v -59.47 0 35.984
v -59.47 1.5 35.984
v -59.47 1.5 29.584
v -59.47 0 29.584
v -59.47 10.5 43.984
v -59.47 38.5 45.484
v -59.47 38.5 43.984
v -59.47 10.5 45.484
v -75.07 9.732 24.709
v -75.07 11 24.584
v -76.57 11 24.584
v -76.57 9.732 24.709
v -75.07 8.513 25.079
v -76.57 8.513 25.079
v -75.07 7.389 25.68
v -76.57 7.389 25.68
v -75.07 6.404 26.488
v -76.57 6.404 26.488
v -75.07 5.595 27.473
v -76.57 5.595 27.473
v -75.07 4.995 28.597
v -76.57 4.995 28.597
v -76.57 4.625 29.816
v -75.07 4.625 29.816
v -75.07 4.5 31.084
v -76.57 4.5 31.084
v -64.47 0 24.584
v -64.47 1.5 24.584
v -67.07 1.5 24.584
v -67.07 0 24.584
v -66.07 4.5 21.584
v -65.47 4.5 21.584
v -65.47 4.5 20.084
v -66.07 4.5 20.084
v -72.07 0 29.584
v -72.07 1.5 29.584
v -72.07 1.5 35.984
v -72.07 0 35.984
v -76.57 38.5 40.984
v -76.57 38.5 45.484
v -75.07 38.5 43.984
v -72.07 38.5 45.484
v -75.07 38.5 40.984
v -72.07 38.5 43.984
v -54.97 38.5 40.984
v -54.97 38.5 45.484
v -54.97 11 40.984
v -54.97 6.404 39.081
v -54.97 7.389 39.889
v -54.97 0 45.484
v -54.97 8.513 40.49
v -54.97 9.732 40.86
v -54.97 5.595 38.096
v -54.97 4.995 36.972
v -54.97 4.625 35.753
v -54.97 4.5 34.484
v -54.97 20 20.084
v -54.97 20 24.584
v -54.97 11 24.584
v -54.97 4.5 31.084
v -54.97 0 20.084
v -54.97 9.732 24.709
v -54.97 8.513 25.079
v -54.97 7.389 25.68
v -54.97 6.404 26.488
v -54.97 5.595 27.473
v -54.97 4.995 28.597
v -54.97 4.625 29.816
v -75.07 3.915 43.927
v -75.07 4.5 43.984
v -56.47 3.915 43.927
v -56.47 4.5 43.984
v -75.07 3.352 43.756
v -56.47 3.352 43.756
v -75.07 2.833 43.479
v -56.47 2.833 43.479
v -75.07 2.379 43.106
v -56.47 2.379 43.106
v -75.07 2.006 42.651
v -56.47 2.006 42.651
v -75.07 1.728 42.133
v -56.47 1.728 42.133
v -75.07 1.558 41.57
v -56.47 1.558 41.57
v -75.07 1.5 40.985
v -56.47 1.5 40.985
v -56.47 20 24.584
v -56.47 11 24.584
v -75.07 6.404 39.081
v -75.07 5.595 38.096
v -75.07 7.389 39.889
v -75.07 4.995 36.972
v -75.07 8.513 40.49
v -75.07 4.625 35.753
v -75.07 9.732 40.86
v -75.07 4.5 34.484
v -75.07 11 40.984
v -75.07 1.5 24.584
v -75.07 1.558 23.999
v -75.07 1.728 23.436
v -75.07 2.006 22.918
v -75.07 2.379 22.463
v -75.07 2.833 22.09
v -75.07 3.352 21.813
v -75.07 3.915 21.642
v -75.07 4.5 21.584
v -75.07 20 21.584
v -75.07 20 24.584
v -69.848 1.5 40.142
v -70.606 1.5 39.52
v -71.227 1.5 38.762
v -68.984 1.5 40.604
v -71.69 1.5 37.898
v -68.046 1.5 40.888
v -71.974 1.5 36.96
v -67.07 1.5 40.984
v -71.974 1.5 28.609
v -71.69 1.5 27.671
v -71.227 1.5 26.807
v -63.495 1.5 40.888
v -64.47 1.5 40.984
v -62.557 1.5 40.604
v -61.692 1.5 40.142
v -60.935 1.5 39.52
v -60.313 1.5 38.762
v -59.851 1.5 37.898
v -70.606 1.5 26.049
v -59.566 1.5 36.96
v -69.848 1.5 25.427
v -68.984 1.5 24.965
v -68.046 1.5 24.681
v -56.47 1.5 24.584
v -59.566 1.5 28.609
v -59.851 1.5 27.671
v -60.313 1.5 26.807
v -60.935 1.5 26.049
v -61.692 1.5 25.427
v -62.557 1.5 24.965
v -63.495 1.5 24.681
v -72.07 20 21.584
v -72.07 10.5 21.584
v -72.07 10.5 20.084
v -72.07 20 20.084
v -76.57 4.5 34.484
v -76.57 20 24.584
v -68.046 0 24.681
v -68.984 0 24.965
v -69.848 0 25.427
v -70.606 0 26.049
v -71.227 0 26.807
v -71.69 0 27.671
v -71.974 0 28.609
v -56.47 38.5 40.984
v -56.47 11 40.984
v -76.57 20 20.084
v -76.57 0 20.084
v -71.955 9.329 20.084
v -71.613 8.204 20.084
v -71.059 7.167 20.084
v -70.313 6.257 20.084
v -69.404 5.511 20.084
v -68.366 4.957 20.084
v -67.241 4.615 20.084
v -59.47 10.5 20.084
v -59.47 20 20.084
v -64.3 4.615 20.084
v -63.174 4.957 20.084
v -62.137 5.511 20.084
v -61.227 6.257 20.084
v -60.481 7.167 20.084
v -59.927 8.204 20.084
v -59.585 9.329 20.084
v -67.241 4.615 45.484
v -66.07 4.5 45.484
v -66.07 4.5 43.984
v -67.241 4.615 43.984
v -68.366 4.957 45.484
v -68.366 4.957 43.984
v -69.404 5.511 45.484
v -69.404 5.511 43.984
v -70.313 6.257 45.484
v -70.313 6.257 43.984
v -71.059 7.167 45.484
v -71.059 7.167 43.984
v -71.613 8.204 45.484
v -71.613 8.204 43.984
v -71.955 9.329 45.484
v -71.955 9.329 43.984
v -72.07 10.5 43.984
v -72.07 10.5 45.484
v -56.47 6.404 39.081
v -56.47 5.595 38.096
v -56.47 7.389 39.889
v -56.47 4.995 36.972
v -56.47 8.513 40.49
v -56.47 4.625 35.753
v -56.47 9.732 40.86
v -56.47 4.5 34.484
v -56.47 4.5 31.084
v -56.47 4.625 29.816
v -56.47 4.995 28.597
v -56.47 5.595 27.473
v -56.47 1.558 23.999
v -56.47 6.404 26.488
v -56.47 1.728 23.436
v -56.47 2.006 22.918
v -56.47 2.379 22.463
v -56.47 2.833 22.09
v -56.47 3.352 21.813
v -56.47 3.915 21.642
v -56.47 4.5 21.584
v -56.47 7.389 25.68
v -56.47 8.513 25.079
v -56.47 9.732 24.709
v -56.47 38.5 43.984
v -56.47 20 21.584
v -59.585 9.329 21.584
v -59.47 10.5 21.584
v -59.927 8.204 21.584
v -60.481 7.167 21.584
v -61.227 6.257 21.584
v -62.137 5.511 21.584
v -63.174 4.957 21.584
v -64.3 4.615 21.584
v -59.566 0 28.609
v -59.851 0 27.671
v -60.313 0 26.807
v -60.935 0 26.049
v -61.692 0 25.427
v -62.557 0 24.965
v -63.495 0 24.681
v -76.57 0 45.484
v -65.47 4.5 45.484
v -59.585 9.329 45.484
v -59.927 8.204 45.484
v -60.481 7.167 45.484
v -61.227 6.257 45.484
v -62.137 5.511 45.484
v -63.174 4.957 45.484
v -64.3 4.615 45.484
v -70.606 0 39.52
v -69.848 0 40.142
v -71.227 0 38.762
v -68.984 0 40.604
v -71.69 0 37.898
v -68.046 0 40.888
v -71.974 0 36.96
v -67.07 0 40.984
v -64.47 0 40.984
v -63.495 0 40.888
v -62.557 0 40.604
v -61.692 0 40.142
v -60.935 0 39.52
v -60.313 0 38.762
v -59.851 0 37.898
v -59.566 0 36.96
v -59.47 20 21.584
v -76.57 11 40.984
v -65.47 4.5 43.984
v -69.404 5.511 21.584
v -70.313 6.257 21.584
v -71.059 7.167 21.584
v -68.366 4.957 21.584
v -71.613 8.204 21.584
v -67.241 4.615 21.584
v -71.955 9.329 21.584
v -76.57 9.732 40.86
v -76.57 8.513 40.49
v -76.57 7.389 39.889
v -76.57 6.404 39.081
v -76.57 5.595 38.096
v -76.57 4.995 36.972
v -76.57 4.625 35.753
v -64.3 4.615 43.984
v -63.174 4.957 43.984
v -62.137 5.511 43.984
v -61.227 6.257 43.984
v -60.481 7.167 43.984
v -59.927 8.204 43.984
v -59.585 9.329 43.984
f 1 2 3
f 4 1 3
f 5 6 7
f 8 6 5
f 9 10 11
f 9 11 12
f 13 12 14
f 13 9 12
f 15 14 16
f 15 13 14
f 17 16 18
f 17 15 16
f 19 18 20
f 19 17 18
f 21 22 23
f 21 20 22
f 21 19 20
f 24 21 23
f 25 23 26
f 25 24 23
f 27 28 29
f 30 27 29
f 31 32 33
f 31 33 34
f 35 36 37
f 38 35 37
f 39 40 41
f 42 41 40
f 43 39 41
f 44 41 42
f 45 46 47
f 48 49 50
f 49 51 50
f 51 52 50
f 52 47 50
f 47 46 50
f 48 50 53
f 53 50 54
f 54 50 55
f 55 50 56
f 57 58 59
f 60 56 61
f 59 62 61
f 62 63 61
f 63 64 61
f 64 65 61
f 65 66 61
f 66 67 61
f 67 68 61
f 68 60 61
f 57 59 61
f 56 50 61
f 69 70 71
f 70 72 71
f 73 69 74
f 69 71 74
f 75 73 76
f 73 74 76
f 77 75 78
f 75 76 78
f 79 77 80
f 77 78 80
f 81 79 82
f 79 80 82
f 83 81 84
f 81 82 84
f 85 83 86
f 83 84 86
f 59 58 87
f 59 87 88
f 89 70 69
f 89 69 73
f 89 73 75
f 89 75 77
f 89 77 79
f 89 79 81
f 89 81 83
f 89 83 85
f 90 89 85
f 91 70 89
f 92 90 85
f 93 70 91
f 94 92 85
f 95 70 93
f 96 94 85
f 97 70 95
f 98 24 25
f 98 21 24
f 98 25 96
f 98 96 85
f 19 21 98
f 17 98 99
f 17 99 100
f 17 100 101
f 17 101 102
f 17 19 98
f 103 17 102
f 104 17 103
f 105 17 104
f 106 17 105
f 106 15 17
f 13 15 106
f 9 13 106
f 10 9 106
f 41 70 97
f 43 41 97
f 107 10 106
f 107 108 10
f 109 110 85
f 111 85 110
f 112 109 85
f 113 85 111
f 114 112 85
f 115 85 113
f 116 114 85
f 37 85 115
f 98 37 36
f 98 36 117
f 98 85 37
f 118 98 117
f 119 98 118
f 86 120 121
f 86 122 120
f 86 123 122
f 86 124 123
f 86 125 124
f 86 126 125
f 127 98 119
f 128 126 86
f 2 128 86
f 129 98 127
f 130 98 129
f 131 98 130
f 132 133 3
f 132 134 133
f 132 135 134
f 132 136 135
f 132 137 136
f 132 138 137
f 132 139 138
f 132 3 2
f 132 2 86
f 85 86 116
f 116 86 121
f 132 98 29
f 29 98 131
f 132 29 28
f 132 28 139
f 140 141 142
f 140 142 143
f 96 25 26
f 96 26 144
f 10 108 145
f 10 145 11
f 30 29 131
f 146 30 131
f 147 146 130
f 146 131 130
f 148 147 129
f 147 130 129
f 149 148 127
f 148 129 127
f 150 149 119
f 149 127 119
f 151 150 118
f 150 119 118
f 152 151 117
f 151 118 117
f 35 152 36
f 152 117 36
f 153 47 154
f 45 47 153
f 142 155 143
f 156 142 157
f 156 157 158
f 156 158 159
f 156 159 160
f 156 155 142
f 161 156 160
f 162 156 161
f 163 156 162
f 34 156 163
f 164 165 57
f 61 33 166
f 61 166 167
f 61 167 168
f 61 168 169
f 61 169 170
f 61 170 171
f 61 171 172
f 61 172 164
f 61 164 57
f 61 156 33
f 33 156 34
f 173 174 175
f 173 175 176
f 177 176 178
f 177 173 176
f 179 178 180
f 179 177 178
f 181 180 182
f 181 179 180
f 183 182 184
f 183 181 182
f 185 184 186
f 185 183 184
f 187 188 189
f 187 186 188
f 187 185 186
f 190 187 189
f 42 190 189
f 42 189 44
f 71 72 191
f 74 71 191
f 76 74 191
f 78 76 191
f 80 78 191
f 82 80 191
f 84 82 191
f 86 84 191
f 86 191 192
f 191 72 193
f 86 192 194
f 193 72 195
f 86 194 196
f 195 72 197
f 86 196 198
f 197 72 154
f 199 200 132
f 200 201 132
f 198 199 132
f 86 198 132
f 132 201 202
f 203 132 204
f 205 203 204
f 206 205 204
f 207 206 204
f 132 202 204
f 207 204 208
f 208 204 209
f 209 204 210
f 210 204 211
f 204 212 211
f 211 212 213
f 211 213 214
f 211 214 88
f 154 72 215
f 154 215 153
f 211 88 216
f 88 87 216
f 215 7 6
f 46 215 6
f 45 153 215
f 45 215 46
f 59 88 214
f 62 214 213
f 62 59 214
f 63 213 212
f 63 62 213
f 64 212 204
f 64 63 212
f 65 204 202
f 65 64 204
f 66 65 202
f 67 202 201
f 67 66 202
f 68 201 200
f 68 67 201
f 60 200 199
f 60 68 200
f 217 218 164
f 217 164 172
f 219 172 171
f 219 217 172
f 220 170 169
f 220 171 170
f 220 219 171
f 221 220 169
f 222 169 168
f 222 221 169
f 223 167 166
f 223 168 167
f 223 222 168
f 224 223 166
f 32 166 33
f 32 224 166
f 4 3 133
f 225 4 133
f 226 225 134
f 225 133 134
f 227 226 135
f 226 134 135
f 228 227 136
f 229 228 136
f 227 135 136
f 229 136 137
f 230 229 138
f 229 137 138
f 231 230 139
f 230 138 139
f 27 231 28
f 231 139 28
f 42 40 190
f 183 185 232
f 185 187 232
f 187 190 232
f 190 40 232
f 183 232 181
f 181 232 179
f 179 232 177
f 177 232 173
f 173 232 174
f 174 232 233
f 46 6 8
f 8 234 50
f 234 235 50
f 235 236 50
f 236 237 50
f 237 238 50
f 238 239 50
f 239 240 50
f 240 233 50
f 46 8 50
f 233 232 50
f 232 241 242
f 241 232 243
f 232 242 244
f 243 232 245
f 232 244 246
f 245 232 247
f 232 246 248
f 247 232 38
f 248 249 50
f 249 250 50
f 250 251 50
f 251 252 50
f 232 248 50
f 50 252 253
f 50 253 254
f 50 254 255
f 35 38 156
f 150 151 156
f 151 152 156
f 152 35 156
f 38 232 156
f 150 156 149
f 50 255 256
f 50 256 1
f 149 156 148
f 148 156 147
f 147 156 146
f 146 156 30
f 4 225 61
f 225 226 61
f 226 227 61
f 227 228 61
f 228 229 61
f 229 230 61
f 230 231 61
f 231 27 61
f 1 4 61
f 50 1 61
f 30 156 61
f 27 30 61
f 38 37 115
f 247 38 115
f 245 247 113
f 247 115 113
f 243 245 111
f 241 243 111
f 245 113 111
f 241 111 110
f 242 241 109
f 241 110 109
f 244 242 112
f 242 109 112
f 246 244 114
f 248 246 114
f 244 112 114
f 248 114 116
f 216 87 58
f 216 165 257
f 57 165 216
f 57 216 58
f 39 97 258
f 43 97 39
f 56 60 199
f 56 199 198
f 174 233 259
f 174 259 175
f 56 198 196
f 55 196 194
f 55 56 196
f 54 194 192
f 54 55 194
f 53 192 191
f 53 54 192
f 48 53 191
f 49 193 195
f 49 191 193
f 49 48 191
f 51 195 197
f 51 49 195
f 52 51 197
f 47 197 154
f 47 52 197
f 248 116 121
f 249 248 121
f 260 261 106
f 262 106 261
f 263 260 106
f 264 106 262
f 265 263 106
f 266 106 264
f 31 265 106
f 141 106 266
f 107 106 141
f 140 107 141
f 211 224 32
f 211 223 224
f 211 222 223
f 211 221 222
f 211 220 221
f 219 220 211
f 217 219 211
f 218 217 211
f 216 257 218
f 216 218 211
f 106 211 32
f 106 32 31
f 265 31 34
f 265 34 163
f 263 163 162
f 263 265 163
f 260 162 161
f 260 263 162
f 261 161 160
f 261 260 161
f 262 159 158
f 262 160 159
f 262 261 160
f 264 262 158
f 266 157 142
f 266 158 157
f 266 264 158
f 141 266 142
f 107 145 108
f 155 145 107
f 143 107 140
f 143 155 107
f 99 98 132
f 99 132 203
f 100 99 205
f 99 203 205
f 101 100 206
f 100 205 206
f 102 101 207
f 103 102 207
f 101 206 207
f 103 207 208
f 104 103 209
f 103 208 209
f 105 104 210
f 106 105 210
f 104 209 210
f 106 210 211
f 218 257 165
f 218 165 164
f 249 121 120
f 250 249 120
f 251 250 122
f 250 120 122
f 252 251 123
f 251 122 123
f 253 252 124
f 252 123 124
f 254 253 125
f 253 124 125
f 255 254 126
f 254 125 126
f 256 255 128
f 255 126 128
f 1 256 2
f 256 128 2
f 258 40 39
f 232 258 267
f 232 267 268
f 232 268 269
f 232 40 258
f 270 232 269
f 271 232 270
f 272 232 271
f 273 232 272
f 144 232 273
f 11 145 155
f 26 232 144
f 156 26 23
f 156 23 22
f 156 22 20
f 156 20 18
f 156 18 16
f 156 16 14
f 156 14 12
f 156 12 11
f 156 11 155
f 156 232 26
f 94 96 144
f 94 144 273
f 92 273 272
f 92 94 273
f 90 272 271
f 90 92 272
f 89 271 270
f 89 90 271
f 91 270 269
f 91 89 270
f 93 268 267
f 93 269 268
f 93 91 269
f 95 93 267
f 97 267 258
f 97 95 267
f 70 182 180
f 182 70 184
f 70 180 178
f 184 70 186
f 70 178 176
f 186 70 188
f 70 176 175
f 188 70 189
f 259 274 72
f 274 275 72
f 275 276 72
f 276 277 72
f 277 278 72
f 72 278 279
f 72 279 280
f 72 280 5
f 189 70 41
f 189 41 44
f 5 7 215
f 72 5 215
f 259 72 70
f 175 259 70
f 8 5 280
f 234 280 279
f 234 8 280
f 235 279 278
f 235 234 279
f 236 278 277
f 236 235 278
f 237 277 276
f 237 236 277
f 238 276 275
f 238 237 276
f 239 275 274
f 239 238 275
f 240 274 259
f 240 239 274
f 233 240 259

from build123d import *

# Parameters (mm, degrees)
SKETCH1_W           = 21.6
SKETCH1_H           = 25.4
BOSS_EXTRUDE1_DEPTH = 38.5
SKETCH2_W           = 18.6
SKETCH2_H           = 22.4
CUT_EXTRUDE1_DEPTH  = 37
CUT_EXTRUDE2_DEPTH  = 25.5
CUT_EXTRUDE3_DEPTH  = 25.5
CUT_EXTRUDE4_DEPTH  = 1.5
FILLET2_R           = 3
FILLET3_R           = 3
SKETCH7_W           = 21.6
SKETCH7_H           = 4.5
CUT_EXTRUDE5_DEPTH  = 18.5


with BuildPart() as part:
    # Sketch1 → Boss-Extrude1 (new body)
    with BuildSketch(Plane(origin=(0, 0, 0), x_dir=(1, 0, 0), z_dir=(0, 1, 0))):
        with Locations((-65.770128024, -32.78448737)):
            Rectangle(SKETCH1_W, SKETCH1_H)
    extrude(amount=BOSS_EXTRUDE1_DEPTH)

    # Sketch2 → Cut-Extrude1 (cut)
    with BuildSketch(Plane(origin=(0, 38.5, 0), x_dir=(1, 0, 0), z_dir=(0, 1, 0))):
        with Locations((-65.770128024, -32.78448737)):
            Rectangle(SKETCH2_W, SKETCH2_H)
    extrude(amount=-CUT_EXTRUDE1_DEPTH, mode=Mode.SUBTRACT)

    # Sketch5 → Cut-Extrude2 (cut)
    with BuildSketch(Plane.XY.offset(45.48448737)):
        with BuildLine():
            Line((-72.070128024, 38.5), (-59.470128024, 38.5))
            Line((-59.470128024, 38.5), (-59.470128024, 10.5))
            ThreePointArc((-59.470128024, 10.5), (-61.227487337, 6.257359313), (-65.470128024, 4.5))
            Line((-65.470128024, 4.5), (-66.070128024, 4.5))
            ThreePointArc((-66.070128024, 4.5), (-70.312768711, 6.257359313), (-72.070128024, 10.5))
            Line((-72.070128024, 10.5), (-72.070128024, 38.5))
        make_face()
    extrude(amount=-CUT_EXTRUDE2_DEPTH, mode=Mode.SUBTRACT)

    # Sketch3 → Cut-Extrude3 (cut)
    with BuildSketch(Plane(origin=(-54.970128024, 0, 0), x_dir=(0, 0, -1), z_dir=(1, 0, 0))):
        with BuildLine():
            Line((-40.98448737, 38.5), (-24.58448737, 38.5))
            Line((-24.58448737, 38.5), (-24.58448737, 11))
            ThreePointArc((-24.58448737, 11), (-26.488293292, 6.403805922), (-31.08448737, 4.5))
            Line((-31.08448737, 4.5), (-34.48448737, 4.5))
            ThreePointArc((-34.48448737, 4.5), (-39.080681448, 6.403805922), (-40.98448737, 11))
            Line((-40.98448737, 11), (-40.98448737, 38.5))
        make_face()
    extrude(amount=-CUT_EXTRUDE3_DEPTH, mode=Mode.SUBTRACT)

    # Sketch6 → Cut-Extrude4 (cut)
    with BuildSketch(Plane(origin=(0, 1.5, 0), x_dir=(1, 0, 0), z_dir=(0, 1, 0))):
        with BuildLine():
            Line((-67.070128024, -40.98448737), (-64.470128024, -40.98448737))
            ThreePointArc((-64.470128024, -40.98448737), (-60.934594118, -39.520021276), (-59.470128024, -35.98448737))
            Line((-59.470128024, -35.98448737), (-59.470128024, -29.58448737))
            ThreePointArc((-59.470128024, -29.58448737), (-60.934594118, -26.048953464), (-64.470128024, -24.58448737))
            Line((-64.470128024, -24.58448737), (-67.070128024, -24.58448737))
            ThreePointArc((-67.070128024, -24.58448737), (-70.60566193, -26.048953464), (-72.070128024, -29.58448737))
            Line((-72.070128024, -29.58448737), (-72.070128024, -35.98448737))
            ThreePointArc((-72.070128024, -35.98448737), (-70.60566193, -39.520021276), (-67.070128024, -40.98448737))
        make_face()
    extrude(amount=-CUT_EXTRUDE4_DEPTH, mode=Mode.SUBTRACT)

    # Fillet2
    fillet2_edges = [part.edges().sort_by_distance(p)[0] for p in [
        (-65.770128024, 1.5, 43.98448737),
    ]]
    fillet(fillet2_edges, radius=FILLET2_R - 0.0001)  # a hair under: the kernel refuses the full size

    # Fillet3
    fillet3_edges = [part.edges().sort_by_distance(p)[0] for p in [
        (-65.770128024, 1.5, 21.58448737),
    ]]
    fillet(fillet3_edges, radius=FILLET3_R - 0.0001)  # a hair under: the kernel refuses the full size

    # Sketch7 → Cut-Extrude5 (cut)
    with BuildSketch(Plane(origin=(0, 38.5, 0), x_dir=(1, 0, 0), z_dir=(0, 1, 0))):
        with Locations((-65.770128024, -22.33448737)):
            Rectangle(SKETCH7_W, SKETCH7_H)
    extrude(amount=-CUT_EXTRUDE5_DEPTH, mode=Mode.SUBTRACT)


solid = part.part
